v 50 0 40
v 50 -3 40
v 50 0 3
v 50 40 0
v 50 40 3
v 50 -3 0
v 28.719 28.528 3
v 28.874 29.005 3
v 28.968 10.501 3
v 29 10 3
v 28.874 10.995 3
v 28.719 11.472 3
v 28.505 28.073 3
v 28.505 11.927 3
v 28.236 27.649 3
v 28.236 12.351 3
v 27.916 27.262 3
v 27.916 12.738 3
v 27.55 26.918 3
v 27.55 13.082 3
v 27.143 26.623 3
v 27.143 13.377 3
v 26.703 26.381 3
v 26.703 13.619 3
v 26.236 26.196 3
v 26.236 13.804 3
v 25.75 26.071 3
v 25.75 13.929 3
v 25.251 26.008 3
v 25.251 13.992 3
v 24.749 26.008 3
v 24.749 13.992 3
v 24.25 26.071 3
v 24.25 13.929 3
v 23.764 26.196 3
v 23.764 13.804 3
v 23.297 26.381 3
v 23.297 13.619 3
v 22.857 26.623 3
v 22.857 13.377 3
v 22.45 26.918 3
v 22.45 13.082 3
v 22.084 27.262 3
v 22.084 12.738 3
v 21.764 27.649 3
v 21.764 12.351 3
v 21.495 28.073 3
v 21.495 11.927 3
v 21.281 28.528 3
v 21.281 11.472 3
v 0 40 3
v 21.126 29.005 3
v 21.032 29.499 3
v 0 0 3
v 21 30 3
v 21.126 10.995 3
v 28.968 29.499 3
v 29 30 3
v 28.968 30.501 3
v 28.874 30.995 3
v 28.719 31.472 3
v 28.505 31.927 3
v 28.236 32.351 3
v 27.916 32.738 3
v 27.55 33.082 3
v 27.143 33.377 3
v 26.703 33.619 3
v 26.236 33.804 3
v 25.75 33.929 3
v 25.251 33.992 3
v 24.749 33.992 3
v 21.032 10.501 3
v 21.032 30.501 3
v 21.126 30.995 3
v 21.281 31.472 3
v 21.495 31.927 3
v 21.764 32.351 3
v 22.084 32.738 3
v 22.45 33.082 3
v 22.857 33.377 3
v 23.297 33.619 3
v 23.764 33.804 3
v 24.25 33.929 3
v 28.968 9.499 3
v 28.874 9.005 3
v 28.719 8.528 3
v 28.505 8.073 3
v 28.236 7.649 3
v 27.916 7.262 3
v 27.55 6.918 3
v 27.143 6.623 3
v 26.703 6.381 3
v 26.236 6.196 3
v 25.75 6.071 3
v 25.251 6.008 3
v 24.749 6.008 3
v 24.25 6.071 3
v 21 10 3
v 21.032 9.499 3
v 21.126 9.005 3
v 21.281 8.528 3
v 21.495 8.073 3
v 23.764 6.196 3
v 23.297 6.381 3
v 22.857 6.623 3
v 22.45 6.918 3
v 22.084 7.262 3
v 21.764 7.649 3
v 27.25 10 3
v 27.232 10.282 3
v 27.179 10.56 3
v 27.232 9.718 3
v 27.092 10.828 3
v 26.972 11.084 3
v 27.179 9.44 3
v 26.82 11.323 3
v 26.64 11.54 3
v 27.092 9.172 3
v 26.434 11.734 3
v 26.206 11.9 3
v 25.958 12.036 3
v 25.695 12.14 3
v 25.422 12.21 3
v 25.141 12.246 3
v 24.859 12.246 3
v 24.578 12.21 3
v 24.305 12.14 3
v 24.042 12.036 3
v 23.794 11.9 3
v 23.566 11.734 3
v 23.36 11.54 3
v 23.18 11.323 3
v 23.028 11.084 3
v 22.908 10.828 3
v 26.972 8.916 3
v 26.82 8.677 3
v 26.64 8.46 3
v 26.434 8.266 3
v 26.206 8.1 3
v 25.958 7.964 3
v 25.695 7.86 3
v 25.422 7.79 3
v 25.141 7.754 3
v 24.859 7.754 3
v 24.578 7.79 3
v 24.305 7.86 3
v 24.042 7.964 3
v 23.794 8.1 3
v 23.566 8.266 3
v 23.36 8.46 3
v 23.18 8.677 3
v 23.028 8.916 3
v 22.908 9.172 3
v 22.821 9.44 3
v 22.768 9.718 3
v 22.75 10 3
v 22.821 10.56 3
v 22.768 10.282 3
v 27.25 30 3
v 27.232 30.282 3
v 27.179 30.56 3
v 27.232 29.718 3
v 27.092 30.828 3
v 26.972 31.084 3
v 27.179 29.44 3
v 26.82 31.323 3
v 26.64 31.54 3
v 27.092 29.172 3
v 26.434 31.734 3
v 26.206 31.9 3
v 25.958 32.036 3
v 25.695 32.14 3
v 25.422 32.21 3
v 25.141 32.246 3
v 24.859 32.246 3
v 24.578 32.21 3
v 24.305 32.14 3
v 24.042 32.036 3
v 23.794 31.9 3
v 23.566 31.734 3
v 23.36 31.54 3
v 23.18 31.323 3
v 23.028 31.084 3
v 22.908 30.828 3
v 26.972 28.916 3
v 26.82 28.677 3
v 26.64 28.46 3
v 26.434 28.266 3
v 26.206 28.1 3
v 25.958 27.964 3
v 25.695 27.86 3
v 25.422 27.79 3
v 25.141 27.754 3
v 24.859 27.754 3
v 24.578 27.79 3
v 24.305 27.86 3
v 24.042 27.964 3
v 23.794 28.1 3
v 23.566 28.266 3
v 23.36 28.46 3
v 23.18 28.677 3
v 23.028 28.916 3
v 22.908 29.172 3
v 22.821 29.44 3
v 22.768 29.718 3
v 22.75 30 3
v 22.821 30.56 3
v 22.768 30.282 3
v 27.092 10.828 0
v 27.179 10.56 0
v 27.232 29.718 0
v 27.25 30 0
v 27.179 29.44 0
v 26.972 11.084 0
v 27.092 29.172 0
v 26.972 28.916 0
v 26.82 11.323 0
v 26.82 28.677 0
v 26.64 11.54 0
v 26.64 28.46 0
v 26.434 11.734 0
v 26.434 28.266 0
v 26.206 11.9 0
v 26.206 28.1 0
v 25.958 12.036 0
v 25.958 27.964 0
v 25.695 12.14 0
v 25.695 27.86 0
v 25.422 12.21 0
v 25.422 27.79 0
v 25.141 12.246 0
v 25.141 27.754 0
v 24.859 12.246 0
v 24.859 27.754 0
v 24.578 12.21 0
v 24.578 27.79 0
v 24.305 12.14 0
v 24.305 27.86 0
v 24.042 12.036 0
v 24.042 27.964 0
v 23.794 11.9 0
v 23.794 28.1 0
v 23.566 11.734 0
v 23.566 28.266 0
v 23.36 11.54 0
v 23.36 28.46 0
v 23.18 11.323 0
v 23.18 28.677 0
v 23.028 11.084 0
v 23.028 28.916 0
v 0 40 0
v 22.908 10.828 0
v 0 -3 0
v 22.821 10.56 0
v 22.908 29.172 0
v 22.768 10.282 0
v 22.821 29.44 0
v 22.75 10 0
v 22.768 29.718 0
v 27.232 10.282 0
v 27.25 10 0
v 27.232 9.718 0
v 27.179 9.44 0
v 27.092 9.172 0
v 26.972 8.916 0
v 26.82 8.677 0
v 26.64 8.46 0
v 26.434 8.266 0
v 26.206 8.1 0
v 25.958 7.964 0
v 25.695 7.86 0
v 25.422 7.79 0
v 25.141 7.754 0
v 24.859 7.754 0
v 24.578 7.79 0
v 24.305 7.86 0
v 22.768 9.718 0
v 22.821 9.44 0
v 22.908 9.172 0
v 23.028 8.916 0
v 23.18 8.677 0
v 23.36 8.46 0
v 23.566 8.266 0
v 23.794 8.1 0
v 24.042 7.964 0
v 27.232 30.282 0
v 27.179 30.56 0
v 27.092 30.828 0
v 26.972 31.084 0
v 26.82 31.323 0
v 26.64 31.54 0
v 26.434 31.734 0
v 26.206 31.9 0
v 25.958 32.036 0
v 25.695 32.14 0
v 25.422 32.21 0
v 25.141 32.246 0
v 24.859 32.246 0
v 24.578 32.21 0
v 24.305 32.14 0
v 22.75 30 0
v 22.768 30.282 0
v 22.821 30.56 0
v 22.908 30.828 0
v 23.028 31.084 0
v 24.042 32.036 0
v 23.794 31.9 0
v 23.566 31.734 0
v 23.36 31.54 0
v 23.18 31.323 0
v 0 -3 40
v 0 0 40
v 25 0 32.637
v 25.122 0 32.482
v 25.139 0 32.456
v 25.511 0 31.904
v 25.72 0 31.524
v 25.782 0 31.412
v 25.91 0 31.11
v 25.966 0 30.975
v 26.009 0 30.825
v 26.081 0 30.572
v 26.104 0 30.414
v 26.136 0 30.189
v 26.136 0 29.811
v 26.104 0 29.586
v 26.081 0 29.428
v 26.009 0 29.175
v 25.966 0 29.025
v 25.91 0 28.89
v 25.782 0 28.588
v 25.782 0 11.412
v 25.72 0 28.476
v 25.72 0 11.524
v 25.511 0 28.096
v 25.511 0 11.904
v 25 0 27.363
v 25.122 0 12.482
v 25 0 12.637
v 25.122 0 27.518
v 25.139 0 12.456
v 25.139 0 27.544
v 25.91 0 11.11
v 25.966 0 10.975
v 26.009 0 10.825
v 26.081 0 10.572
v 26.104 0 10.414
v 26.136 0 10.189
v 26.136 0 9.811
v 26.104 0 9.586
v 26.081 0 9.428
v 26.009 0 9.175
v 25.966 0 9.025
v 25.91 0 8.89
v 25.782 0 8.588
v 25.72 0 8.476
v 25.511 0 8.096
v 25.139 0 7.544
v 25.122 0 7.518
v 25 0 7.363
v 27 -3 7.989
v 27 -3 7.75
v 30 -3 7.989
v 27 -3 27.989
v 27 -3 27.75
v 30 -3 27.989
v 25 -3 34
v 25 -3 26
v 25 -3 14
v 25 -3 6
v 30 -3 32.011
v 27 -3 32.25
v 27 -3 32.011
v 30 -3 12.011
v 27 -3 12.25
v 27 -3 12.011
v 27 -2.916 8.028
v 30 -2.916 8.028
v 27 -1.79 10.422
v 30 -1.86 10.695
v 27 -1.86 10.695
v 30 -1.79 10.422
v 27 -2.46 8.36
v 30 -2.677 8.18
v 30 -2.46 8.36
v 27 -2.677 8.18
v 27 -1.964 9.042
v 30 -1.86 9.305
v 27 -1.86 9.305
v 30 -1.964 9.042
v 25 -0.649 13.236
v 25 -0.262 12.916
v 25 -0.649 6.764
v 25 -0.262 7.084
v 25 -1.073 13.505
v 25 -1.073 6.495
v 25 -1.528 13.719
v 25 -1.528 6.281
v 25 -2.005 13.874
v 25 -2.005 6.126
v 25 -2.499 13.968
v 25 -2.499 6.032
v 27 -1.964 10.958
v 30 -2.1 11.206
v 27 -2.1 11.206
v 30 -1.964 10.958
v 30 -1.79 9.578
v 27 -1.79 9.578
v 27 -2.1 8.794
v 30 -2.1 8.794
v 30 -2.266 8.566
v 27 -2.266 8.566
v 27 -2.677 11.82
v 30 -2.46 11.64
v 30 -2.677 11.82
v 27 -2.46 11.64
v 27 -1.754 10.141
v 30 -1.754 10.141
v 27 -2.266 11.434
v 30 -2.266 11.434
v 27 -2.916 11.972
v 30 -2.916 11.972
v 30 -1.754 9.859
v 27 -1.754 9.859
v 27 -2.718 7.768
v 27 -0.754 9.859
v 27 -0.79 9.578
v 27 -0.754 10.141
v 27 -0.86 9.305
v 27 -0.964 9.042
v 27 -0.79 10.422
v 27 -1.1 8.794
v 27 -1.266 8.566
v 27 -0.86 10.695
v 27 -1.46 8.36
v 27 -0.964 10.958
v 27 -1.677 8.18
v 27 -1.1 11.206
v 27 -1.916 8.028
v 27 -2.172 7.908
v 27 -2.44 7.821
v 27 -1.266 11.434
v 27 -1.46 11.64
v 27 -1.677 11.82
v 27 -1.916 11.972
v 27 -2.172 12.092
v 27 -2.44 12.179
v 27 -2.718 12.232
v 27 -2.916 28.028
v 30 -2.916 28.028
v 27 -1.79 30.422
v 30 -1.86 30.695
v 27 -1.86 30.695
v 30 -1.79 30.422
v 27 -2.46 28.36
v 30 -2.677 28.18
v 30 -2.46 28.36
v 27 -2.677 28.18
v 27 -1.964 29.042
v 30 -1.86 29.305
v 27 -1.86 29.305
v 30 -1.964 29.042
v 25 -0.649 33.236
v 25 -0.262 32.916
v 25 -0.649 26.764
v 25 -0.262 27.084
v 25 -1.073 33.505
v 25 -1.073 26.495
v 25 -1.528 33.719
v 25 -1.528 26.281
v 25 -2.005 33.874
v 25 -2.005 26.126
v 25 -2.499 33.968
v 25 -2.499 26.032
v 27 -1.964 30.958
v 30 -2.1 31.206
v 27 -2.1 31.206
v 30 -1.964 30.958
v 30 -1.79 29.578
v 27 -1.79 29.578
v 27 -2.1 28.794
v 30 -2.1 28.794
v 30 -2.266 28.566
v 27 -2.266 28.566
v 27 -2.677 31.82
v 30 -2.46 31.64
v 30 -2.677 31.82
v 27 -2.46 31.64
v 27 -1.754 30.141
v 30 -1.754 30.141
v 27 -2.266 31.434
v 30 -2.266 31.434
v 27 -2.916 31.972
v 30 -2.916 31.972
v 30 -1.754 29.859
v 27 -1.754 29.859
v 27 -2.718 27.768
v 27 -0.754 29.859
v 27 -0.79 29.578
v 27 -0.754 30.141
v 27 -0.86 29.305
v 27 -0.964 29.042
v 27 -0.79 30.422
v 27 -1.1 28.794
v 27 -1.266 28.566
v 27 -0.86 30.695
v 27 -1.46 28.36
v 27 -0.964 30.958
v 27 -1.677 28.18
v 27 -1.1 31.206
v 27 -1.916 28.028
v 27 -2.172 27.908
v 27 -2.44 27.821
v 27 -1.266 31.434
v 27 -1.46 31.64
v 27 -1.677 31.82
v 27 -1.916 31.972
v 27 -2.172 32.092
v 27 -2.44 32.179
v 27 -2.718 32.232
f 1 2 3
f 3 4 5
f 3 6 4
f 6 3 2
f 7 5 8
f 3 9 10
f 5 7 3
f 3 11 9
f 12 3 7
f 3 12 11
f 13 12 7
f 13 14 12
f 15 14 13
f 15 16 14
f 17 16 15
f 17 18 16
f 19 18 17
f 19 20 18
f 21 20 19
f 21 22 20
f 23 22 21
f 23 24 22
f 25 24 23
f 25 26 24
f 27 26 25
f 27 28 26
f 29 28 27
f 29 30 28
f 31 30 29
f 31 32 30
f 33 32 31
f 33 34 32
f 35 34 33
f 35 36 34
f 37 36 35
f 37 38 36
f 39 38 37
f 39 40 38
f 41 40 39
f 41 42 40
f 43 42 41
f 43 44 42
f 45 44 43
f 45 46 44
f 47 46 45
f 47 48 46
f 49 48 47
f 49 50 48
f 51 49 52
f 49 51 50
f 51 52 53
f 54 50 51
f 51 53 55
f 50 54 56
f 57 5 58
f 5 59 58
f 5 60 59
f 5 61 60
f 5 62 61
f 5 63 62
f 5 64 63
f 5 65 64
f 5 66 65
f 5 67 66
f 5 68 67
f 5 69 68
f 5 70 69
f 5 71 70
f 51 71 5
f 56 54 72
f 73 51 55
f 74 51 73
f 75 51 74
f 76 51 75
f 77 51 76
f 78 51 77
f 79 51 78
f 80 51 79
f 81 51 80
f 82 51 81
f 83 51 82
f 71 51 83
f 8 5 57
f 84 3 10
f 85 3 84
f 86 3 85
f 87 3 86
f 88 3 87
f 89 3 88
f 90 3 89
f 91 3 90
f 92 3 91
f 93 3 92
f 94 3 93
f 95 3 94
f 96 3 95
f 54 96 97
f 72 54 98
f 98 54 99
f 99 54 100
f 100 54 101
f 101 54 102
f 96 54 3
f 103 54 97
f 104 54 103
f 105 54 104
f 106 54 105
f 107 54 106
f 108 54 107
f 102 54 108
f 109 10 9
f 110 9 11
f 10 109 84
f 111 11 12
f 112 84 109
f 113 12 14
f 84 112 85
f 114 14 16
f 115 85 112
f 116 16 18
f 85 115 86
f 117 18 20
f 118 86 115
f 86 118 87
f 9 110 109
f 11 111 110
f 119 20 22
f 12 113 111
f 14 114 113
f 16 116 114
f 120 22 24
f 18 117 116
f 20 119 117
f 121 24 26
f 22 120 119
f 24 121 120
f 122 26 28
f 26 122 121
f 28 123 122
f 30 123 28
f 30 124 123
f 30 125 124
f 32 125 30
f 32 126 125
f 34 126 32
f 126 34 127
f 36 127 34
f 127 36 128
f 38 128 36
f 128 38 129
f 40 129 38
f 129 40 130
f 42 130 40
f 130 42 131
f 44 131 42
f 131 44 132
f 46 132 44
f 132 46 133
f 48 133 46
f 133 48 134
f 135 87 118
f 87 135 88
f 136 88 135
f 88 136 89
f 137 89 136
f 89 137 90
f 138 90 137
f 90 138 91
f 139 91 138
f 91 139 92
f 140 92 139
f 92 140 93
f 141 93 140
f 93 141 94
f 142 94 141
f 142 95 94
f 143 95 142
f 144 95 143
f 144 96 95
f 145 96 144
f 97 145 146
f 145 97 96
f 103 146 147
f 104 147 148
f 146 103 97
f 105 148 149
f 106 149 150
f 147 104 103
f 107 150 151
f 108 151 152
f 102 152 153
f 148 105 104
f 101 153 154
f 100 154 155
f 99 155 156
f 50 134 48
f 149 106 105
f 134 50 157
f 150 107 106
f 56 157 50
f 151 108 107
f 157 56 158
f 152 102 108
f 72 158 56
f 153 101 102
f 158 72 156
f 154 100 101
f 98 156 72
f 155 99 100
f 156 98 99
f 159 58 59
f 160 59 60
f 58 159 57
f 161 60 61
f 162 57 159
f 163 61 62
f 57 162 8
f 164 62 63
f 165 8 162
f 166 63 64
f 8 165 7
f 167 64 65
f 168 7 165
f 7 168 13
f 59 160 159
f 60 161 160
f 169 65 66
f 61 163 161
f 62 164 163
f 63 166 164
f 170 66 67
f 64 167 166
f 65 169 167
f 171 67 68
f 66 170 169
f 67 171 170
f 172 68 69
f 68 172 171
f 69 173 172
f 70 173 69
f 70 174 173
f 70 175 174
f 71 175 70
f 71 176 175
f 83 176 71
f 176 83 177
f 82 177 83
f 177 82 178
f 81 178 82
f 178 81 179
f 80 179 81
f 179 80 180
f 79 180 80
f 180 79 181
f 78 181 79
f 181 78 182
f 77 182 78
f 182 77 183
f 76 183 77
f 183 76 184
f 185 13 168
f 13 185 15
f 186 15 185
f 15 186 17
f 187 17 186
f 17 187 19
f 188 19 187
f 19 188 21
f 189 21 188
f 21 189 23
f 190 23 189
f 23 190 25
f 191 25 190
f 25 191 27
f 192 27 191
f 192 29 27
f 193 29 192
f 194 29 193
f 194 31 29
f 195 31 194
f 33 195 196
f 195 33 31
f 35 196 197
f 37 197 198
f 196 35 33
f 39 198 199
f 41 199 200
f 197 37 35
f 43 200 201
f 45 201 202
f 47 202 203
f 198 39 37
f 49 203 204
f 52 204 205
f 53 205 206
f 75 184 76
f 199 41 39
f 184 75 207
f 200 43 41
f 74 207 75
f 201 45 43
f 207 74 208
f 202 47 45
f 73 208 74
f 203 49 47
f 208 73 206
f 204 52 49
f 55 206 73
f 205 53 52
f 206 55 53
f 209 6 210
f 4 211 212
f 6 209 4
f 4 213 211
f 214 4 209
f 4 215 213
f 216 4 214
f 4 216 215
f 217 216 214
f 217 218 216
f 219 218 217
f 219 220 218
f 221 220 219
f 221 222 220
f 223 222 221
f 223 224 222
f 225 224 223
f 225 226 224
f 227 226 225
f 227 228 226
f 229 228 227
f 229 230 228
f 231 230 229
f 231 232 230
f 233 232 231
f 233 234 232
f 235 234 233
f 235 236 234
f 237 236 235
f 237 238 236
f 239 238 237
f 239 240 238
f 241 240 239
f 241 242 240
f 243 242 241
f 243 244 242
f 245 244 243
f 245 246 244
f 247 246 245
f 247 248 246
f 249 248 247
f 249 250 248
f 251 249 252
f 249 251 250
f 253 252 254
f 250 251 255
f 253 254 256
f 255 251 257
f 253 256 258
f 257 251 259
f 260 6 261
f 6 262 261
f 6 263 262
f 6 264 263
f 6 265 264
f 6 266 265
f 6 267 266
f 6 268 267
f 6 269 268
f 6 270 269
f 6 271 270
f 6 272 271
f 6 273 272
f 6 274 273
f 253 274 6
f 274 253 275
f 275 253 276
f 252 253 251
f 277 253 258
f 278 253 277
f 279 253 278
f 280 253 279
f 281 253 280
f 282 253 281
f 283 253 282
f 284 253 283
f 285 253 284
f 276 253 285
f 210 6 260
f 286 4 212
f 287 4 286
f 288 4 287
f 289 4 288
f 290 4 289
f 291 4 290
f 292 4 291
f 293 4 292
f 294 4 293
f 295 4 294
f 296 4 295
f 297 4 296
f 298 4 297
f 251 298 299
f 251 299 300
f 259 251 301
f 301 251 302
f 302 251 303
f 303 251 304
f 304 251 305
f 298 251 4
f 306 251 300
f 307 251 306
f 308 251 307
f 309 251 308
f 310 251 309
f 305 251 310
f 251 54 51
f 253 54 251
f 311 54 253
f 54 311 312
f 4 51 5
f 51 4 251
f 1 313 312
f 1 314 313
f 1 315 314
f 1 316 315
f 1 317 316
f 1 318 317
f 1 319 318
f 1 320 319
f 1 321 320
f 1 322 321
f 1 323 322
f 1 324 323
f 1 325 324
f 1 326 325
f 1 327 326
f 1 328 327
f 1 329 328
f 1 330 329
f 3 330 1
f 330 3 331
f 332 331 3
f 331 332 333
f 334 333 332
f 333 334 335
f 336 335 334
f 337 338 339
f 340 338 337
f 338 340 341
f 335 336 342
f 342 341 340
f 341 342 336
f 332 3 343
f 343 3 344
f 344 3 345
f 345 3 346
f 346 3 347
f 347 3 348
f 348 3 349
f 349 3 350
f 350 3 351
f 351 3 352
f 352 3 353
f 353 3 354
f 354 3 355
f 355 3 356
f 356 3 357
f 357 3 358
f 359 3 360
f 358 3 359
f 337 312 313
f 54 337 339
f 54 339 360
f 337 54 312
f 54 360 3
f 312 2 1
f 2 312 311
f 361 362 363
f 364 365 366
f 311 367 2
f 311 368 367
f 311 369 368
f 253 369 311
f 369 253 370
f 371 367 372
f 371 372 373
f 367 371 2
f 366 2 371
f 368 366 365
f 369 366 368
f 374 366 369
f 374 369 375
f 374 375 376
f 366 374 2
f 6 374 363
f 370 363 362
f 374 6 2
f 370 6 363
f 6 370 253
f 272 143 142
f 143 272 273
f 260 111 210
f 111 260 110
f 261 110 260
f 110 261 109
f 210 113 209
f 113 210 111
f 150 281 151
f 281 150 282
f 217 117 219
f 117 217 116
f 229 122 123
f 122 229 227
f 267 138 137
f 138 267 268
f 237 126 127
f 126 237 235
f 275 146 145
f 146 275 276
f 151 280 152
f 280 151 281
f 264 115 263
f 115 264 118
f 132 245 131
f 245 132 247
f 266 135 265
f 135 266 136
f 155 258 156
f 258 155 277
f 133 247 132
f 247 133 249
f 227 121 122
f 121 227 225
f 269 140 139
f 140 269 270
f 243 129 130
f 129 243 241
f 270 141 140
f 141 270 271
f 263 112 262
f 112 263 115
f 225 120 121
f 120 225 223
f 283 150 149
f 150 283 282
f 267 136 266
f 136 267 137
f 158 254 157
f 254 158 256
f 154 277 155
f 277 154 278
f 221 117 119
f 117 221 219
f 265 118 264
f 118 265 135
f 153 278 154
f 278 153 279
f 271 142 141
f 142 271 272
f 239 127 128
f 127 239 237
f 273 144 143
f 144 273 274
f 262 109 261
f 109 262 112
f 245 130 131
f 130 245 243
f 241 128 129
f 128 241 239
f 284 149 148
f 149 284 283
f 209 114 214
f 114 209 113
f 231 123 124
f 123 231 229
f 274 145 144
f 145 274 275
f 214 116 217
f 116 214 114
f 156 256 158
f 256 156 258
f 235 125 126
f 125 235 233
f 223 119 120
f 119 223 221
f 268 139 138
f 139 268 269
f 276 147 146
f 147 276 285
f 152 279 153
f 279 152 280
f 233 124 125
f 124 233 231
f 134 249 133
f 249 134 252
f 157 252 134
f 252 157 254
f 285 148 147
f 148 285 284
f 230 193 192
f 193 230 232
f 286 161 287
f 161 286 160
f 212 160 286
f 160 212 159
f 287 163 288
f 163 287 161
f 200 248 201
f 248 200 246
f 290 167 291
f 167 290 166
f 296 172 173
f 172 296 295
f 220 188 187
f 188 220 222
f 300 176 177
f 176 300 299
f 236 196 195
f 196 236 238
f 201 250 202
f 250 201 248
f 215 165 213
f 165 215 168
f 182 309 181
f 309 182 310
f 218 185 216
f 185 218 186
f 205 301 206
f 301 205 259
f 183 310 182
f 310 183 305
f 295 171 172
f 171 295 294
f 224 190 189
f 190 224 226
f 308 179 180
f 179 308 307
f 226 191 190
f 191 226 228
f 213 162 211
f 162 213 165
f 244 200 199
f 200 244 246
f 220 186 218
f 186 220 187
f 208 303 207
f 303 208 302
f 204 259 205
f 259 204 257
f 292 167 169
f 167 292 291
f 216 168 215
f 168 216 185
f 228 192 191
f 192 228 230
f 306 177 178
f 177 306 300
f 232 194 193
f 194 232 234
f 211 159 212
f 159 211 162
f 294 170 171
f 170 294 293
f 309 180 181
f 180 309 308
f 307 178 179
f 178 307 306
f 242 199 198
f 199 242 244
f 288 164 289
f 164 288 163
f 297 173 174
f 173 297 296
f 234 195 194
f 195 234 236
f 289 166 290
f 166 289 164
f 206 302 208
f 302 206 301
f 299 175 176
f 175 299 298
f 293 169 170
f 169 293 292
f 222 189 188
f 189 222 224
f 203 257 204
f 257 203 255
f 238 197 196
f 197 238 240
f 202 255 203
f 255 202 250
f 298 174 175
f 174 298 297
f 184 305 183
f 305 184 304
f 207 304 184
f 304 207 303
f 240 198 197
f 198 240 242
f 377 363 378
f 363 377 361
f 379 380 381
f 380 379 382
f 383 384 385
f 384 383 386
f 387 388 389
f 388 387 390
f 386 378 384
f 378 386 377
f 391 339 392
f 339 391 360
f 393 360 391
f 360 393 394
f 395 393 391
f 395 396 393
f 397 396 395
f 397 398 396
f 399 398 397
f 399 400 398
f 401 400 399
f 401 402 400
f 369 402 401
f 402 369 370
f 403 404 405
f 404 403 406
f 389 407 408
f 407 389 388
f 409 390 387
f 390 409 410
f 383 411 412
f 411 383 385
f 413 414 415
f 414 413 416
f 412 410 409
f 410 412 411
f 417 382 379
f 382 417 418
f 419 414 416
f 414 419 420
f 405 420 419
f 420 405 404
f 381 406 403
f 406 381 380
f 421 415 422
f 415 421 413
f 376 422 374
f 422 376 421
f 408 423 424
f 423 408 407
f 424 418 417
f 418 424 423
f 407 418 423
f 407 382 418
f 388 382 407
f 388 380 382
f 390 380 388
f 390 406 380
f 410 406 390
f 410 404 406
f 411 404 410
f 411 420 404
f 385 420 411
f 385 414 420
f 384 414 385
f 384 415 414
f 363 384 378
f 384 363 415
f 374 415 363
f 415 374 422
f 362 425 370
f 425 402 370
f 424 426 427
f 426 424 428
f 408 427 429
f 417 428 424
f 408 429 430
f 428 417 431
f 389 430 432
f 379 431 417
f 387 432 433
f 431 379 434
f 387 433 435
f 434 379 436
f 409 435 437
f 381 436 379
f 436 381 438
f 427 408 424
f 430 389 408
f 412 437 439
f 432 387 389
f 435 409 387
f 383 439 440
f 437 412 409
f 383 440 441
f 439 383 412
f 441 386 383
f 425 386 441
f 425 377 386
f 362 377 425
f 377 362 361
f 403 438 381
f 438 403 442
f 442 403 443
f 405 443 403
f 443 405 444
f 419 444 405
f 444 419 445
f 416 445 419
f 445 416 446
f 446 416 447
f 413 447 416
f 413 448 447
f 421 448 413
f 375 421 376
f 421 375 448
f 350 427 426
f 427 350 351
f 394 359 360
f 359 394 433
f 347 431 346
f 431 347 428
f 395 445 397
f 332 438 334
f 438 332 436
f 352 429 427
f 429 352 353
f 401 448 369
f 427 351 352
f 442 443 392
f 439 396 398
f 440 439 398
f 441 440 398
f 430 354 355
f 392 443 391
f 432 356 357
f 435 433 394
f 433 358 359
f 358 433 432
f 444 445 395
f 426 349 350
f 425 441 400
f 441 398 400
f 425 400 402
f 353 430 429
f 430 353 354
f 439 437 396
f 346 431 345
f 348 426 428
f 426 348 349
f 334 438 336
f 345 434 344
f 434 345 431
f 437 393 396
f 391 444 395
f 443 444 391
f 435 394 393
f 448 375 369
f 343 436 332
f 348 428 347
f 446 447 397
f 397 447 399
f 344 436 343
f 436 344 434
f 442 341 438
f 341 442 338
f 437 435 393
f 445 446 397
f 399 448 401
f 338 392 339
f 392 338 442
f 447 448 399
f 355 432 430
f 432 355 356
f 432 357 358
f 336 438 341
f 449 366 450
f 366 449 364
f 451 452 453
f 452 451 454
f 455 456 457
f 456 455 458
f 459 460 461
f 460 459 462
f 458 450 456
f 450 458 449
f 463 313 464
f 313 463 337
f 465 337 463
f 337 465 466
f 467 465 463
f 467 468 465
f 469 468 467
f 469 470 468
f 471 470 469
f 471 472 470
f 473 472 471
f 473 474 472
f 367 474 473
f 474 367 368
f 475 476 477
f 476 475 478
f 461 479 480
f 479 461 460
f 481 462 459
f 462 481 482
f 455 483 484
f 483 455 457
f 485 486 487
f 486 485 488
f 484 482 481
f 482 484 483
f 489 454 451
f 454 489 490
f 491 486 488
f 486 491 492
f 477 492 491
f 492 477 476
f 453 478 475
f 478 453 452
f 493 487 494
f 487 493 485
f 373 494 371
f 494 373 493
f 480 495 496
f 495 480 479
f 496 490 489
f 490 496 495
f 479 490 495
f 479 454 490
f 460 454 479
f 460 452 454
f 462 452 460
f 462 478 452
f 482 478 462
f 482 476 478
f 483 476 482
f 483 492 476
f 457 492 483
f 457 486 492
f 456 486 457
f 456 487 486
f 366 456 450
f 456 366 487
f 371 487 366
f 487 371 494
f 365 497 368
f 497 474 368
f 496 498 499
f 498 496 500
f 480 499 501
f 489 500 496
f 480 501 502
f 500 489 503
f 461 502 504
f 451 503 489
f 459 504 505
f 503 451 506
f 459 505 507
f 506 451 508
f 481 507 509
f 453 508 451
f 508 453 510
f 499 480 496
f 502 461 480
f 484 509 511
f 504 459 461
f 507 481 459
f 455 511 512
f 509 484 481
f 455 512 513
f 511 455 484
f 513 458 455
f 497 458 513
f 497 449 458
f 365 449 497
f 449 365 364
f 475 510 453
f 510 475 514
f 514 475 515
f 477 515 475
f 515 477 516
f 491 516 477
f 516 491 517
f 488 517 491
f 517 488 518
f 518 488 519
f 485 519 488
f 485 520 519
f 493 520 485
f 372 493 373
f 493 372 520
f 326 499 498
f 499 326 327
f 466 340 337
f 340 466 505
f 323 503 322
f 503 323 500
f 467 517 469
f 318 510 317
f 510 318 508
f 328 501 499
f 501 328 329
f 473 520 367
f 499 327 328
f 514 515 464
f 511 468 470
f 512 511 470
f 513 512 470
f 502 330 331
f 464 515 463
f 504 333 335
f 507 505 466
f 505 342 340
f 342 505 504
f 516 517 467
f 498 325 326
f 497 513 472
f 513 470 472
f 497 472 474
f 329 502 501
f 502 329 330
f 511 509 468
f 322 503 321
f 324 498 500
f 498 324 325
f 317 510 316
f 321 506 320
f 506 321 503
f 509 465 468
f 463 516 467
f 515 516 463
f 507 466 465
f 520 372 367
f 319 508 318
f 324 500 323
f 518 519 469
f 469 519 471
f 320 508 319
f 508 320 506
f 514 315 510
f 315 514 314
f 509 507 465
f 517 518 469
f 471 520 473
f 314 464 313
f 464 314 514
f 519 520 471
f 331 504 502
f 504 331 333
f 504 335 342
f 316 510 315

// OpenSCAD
$fn = 50;

difference() {
    // --- L-bracket Body ---
    union() {
        // Horizontal flange: 50mm (W) x 40mm (D) x 3mm (T)
        // Positioned so inner surface is at Z=0 and outer surface is at Z=3
        cube([50, 40, 3]);
        
        // Vertical flange: 50mm (W) x 3mm (T) x 40mm (H)
        // Positioned so inner surface is at Y=0 and outer surface is at Y=-3
        translate([0, -3, 0])
            cube([50, 3, 40]);
    }

    // --- Countersunk Holes: Horizontal Plane (Top surface at Z=3) ---
    // Holes are located at X=25, Y=10 and Y=30
    for (y_pos = [10, 30]) {
        // M4 Through-hole (Φ4.5mm)
        translate([25, y_pos, -1])
            cylinder(d=4.5, h=5);
        
        // Countersink (Φ8mm, depth 2mm) 
        // d1 is the base diameter (at the outer surface Z=3), d2 is the top diameter
        translate([25, y_pos, 3])
            cylinder(d1=8, d2=4.5, h=2);
    }

    // --- Countersunk Holes: Vertical Plane (Back surface at Y=-3) ---
    // Holes are located at X=25, Z=10 and Z=30
    for (z_pos = [10, 30]) {
        // M4 Through-hole (Φ4.5mm)
        translate([25, -4, z_pos])
            rotate([0, 90, 0])
            cylinder(d=4.5, h=5);
            
        // Countersink (Φ8mm, depth 2mm)
        // Rotated to face the outer surface Y=-3
        translate([25, -3, z_pos])
            rotate([0, 90, 0])
            cylinder(d1=8, d2=4.5, h=2);
    }
}
